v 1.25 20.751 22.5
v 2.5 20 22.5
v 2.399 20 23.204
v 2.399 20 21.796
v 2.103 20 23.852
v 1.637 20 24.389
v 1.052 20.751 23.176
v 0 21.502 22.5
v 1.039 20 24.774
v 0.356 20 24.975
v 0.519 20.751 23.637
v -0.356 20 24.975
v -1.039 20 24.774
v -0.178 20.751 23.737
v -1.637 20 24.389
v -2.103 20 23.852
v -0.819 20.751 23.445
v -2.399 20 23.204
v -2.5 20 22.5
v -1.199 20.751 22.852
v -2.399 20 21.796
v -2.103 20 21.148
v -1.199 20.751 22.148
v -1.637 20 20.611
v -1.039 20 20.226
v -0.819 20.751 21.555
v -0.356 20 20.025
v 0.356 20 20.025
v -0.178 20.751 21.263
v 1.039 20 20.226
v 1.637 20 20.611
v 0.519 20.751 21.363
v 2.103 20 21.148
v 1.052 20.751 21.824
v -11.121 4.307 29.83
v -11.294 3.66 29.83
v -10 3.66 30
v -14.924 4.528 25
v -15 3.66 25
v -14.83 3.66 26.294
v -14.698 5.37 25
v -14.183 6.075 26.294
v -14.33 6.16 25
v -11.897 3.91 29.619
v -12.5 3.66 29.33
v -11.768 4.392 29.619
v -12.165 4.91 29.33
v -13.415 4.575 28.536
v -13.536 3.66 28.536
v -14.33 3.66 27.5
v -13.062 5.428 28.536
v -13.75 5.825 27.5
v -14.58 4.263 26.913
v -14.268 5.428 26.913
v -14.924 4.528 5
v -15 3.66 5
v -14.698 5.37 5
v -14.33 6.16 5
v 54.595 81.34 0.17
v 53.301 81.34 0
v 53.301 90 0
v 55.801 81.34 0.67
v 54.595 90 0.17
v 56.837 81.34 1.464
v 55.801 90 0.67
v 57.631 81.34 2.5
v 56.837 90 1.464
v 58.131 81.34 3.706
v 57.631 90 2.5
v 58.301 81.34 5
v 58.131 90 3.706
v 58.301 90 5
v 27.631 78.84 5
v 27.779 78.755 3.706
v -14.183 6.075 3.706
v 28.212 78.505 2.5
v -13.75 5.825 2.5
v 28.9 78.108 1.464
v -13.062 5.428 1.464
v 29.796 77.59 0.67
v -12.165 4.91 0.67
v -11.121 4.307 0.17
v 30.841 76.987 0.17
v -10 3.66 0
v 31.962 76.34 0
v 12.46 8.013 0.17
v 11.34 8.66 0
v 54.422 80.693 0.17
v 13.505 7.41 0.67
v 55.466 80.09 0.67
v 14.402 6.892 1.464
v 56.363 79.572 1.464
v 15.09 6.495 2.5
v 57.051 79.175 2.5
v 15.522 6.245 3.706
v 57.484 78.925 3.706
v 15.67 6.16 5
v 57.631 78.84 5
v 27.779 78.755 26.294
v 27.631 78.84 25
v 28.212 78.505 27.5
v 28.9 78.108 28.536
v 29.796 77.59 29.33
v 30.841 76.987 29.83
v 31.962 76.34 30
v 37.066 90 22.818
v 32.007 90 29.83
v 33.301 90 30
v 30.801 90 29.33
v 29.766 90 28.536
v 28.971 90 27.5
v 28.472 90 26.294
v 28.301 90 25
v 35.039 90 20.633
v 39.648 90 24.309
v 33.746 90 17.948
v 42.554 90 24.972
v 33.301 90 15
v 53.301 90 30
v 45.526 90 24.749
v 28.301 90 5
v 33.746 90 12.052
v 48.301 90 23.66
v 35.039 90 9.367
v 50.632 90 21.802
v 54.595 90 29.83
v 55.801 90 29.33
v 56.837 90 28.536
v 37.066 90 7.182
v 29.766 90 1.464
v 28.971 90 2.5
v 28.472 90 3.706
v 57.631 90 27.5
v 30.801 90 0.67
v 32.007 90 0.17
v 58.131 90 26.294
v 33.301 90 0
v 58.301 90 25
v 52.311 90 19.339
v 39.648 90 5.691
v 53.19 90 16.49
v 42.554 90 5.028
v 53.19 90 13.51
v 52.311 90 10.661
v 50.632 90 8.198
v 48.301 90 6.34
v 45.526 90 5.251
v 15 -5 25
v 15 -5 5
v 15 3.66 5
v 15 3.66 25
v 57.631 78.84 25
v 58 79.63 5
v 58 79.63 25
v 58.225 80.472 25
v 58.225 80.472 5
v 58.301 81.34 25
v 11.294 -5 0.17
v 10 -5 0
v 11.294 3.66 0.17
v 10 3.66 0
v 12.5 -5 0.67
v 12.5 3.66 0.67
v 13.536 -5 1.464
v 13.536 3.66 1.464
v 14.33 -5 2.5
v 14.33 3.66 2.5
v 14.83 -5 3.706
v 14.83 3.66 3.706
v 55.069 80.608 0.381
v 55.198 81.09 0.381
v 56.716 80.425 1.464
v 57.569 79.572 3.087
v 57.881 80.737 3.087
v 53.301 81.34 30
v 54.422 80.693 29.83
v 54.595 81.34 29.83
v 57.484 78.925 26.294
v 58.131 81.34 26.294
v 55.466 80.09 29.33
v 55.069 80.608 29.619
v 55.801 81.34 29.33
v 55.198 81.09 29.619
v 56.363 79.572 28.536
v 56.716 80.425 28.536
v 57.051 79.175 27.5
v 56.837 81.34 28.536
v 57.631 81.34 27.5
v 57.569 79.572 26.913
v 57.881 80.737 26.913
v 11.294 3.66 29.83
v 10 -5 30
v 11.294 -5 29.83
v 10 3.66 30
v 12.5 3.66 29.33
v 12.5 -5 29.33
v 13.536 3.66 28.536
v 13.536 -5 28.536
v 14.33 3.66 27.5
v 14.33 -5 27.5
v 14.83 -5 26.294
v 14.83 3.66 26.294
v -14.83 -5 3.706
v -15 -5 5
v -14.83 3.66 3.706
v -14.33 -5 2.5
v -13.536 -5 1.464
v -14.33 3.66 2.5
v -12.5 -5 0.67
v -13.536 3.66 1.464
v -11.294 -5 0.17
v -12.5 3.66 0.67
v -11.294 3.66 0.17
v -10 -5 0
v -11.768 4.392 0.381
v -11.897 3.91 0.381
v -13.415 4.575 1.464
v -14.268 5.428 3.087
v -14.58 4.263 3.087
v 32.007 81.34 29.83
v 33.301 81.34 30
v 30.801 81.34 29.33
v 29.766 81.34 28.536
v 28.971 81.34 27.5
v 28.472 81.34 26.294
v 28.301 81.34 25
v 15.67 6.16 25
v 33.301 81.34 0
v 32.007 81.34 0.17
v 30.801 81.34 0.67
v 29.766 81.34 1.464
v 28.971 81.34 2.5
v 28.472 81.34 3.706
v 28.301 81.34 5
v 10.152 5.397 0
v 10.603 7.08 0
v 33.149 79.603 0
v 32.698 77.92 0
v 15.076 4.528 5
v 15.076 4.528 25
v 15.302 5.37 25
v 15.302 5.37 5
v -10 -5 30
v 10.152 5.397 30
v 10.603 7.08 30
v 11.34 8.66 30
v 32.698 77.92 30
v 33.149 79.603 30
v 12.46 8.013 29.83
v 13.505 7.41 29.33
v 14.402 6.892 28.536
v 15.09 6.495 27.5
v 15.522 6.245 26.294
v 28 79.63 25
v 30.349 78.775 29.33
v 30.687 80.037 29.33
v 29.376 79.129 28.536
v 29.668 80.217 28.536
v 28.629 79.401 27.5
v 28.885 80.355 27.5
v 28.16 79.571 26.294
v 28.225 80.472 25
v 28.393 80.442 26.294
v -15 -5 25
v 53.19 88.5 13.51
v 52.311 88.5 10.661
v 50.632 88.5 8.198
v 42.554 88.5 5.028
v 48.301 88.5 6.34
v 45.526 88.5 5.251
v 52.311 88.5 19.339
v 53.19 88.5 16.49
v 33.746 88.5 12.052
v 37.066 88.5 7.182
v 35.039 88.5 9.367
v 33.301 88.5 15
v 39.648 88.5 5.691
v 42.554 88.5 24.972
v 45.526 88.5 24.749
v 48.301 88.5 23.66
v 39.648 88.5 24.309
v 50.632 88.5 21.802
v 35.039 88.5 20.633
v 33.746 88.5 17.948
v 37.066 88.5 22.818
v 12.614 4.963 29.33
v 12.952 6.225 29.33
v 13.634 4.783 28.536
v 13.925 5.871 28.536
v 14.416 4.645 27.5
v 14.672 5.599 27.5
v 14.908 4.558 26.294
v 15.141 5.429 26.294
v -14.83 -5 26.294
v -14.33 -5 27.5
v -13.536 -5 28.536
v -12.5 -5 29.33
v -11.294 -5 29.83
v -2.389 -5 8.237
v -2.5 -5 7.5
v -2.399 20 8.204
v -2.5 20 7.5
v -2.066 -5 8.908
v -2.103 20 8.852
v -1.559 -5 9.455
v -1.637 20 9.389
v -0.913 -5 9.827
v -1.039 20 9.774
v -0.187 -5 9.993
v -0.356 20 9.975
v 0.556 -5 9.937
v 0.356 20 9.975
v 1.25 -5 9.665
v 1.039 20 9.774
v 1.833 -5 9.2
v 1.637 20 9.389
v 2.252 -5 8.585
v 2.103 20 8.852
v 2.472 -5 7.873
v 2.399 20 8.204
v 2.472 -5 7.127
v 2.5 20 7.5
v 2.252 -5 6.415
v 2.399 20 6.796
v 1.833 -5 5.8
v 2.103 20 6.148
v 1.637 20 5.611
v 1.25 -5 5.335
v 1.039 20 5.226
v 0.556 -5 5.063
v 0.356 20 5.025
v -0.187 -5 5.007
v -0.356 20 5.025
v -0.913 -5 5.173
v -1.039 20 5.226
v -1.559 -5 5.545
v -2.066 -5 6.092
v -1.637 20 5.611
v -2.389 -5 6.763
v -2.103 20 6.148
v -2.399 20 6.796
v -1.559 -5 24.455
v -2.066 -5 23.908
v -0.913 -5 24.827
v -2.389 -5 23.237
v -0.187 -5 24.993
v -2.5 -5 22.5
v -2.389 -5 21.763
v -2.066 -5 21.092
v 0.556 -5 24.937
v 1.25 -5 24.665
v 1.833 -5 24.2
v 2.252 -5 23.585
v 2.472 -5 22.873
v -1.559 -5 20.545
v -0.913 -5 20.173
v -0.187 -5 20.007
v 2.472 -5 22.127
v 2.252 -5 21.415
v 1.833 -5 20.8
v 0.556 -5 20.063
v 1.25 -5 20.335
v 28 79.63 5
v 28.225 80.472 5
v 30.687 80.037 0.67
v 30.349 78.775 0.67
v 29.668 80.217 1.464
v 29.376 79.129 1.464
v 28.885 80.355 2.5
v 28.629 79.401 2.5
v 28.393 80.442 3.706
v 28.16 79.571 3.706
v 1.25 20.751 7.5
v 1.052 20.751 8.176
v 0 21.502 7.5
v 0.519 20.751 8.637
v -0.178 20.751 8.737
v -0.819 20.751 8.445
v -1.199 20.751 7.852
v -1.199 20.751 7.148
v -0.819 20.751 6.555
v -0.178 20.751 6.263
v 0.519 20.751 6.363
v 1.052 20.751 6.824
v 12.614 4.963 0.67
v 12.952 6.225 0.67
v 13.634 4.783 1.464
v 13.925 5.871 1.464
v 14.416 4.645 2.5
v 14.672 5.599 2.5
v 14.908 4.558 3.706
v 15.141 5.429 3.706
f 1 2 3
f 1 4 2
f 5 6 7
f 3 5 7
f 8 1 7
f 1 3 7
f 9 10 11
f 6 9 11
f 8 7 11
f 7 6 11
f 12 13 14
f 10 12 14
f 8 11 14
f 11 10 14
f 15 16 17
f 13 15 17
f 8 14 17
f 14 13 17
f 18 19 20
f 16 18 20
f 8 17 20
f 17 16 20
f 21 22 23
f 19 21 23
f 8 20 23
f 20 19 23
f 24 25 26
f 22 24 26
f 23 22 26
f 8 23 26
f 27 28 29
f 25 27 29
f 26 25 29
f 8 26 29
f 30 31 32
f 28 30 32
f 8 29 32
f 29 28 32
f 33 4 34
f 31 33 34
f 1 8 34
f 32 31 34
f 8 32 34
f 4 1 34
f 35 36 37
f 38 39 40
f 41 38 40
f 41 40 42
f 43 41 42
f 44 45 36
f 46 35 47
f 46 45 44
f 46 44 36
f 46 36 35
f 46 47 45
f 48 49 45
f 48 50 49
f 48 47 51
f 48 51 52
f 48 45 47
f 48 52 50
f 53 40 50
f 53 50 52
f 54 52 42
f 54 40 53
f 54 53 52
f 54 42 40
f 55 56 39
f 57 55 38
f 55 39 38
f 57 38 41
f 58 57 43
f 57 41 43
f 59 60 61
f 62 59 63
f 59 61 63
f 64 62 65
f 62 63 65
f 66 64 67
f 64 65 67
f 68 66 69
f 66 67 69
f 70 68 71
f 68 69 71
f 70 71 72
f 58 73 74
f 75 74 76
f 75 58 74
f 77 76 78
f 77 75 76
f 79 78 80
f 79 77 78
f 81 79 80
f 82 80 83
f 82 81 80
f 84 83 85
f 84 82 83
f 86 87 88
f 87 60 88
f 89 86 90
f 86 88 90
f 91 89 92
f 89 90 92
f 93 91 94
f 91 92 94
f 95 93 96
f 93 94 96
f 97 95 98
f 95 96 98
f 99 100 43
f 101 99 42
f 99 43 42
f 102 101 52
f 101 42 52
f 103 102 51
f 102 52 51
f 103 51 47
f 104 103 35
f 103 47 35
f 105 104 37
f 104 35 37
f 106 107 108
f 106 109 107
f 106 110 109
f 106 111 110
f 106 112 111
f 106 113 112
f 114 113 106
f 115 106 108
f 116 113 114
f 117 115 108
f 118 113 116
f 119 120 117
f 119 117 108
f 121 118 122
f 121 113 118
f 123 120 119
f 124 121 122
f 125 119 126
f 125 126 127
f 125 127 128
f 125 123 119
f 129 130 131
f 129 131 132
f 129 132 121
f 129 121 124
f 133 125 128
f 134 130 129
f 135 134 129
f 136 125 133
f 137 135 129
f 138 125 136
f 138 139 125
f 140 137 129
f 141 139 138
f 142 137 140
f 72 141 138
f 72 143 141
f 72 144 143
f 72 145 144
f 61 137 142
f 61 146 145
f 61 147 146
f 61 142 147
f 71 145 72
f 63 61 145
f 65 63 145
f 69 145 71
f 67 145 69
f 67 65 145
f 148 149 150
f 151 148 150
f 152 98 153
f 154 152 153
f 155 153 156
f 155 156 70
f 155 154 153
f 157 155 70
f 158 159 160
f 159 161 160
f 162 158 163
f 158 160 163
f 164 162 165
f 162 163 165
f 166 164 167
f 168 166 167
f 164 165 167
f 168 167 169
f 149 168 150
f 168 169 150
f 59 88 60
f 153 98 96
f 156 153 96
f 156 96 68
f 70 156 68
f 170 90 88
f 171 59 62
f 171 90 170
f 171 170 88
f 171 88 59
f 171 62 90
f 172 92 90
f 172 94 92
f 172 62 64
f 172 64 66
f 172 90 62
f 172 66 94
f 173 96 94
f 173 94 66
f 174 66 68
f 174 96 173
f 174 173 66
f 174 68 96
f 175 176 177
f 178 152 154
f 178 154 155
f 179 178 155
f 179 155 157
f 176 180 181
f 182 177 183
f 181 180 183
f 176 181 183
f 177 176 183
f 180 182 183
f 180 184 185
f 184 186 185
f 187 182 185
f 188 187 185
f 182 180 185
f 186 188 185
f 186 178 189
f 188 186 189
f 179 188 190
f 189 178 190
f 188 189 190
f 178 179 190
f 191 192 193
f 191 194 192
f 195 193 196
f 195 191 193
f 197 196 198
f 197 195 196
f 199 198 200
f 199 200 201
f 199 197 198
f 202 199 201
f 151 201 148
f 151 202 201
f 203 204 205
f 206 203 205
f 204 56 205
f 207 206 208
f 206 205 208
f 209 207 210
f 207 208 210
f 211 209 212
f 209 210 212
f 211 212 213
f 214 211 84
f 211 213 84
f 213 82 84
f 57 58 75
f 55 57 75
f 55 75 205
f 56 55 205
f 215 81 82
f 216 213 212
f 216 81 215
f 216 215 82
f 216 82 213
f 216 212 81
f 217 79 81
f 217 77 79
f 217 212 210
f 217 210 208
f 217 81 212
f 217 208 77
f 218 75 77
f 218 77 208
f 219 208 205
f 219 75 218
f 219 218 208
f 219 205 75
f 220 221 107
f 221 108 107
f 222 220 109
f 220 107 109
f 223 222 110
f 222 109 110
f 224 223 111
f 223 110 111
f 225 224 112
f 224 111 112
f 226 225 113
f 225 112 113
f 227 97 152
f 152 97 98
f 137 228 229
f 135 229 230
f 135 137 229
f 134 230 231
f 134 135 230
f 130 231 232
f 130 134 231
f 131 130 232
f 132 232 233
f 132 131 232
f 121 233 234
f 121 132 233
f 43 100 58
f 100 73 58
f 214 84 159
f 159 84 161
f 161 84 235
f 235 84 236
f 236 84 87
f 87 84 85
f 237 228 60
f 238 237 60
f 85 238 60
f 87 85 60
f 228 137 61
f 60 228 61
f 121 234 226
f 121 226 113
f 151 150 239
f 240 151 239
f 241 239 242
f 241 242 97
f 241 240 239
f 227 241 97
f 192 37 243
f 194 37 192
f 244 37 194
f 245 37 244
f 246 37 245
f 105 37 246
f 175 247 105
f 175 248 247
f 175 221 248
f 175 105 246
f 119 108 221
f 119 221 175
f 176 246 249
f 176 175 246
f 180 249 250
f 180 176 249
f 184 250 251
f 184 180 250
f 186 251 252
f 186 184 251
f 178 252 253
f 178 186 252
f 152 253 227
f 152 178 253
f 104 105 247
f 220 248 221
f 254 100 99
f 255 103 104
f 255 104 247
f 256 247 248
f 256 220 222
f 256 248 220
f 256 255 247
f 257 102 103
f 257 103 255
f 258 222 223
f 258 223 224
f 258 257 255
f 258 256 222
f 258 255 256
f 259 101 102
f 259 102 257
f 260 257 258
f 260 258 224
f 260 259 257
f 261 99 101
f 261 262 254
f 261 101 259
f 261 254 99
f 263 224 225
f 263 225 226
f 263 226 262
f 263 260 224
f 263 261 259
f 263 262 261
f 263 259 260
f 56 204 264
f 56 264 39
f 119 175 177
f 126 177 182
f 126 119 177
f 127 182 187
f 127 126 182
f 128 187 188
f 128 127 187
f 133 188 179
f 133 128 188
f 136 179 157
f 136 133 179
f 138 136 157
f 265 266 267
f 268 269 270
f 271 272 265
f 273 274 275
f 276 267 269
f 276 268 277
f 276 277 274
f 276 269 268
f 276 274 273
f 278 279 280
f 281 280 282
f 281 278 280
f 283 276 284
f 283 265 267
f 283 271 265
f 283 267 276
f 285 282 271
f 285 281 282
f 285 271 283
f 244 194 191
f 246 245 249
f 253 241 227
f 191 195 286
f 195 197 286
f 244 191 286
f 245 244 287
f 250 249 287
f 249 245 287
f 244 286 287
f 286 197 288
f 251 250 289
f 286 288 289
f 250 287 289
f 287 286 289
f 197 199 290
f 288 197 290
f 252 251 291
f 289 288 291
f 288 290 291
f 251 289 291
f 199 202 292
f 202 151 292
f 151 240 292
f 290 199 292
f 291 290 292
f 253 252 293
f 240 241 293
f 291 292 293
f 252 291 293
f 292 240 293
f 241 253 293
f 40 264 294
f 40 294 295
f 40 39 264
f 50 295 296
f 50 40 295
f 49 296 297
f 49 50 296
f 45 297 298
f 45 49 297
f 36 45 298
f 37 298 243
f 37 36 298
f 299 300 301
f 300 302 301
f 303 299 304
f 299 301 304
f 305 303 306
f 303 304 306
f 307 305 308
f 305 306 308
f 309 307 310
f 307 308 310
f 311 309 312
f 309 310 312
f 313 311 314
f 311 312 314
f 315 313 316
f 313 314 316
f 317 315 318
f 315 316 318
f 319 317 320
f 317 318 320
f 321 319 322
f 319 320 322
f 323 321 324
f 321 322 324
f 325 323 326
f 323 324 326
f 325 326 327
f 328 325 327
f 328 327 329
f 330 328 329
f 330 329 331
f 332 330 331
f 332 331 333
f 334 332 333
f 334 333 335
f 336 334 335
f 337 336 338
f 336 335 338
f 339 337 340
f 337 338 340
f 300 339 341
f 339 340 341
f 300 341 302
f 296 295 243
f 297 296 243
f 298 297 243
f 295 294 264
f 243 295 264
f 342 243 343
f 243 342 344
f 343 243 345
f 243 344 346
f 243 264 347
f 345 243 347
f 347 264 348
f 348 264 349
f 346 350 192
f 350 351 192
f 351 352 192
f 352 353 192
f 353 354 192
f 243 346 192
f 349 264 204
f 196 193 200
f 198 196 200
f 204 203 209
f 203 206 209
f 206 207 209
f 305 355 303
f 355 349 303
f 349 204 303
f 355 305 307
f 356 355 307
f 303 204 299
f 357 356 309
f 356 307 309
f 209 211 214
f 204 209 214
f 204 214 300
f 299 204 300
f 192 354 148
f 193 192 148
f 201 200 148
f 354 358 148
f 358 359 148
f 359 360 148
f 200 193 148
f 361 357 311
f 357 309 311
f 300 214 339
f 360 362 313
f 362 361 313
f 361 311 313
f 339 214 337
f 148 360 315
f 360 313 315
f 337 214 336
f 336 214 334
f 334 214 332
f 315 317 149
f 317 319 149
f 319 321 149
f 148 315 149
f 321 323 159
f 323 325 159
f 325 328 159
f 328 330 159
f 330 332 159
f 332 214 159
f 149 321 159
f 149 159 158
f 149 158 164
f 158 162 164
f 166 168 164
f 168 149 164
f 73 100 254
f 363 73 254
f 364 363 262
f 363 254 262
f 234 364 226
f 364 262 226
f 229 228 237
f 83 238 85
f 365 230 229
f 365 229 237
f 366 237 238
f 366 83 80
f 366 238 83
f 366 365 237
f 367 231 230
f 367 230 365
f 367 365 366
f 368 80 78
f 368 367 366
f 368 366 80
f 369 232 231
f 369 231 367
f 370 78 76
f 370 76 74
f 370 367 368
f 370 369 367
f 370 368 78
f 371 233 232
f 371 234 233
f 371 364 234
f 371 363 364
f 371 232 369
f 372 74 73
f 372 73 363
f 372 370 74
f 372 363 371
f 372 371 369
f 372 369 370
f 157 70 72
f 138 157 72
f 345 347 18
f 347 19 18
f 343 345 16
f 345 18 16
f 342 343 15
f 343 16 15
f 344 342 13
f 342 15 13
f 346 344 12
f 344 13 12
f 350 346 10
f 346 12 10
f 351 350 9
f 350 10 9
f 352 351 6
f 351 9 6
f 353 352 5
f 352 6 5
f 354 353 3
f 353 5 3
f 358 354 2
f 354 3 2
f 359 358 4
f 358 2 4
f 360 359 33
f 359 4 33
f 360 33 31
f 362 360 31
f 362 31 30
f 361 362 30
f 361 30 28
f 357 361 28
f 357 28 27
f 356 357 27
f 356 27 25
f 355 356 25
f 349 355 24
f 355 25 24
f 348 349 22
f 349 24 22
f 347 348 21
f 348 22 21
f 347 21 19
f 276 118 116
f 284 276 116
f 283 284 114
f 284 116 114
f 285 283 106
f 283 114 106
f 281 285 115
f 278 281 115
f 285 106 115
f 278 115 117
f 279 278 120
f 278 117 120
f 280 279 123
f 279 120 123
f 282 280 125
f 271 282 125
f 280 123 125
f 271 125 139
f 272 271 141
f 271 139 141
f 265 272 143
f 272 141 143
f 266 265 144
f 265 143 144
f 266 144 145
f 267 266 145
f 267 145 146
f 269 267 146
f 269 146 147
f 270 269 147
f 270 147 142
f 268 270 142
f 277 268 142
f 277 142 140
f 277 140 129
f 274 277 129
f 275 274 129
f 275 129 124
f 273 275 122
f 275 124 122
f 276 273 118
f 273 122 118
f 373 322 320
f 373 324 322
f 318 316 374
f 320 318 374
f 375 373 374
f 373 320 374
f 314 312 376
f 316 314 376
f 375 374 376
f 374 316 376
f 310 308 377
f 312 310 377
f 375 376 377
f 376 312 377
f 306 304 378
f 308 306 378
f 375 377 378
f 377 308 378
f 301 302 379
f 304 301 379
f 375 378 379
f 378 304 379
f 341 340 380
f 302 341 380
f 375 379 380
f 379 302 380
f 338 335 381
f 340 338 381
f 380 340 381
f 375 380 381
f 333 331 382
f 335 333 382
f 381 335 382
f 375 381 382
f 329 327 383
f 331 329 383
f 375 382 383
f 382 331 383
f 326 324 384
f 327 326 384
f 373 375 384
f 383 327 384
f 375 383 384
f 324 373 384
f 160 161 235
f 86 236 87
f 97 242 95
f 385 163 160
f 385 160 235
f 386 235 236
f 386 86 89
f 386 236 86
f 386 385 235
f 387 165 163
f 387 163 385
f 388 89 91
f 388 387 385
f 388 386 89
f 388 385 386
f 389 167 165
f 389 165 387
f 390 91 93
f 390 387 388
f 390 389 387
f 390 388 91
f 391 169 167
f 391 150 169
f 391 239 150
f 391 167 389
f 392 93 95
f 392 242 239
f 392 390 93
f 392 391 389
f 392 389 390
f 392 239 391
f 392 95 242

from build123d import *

# Parameters (mm, degrees)
F0_W     = 30
F0_H     = 10
F1_DEPTH = 30
F3_D     = 5
F3_DEPTH = 25
F3_TIP   = 1.5021515476
F4_R     = 5
F5_R     = 10
F6_DEPTH = 1.5


with BuildPart() as f1:
    # F0 (on Top) → F1 (new body)
    with BuildSketch(Plane.XY):
        Rectangle(F0_W, F0_H)
        Polygon((-15, 5), (15, 5), (58.3012701892, 80), (28.3012701892, 80), align=None)
        with Locations((43.3012701892, 85)):
            Rectangle(F0_W, F0_H)
    extrude(amount=F1_DEPTH)

    # F3
    with Locations(Plane.XZ.offset(5)):
        with Locations((0, 22.5), (0, 7.5)):
            Hole(F3_D / 2, depth=F3_DEPTH)
            with Locations((0, 0, -(F3_DEPTH + F3_TIP / 2))):  # 118° drill point
                Cone(0, F3_D / 2, F3_TIP, mode=Mode.SUBTRACT)

    # F4
    f4_edges = [f1.edges().sort_by_distance(p)[0] for p in [
        (15, 0, 0),
        (36.650635, 42.5, 0),
        (15, 0, 30),
        (36.650635, 42.5, 30),
        (-15, 0, 30),
        (6.650635, 42.5, 30),
        (28.30127, 85, 30),
        (58.30127, 85, 30),
        (58.30127, 85, 0),
        (28.30127, 85, 0),
        (6.650635, 42.5, 0),
        (-15, 0, 0),
        (58.30127, 80, 15),
        (15, 5, 15),
        (-15, 5, 15),
        (28.30127, 80, 15),
    ]]
    fillet(f4_edges, radius=F4_R)

    # F5 (on face) → F6 (cut)
    with BuildSketch(Plane(origin=(0, 90, 0), x_dir=(-1, 0, 0), z_dir=(0, 1, 0))):
        with Locations((-43.3012701892, 15)):
            Circle(F5_R)
    extrude(amount=-F6_DEPTH, mode=Mode.SUBTRACT)


solid = f1.part
